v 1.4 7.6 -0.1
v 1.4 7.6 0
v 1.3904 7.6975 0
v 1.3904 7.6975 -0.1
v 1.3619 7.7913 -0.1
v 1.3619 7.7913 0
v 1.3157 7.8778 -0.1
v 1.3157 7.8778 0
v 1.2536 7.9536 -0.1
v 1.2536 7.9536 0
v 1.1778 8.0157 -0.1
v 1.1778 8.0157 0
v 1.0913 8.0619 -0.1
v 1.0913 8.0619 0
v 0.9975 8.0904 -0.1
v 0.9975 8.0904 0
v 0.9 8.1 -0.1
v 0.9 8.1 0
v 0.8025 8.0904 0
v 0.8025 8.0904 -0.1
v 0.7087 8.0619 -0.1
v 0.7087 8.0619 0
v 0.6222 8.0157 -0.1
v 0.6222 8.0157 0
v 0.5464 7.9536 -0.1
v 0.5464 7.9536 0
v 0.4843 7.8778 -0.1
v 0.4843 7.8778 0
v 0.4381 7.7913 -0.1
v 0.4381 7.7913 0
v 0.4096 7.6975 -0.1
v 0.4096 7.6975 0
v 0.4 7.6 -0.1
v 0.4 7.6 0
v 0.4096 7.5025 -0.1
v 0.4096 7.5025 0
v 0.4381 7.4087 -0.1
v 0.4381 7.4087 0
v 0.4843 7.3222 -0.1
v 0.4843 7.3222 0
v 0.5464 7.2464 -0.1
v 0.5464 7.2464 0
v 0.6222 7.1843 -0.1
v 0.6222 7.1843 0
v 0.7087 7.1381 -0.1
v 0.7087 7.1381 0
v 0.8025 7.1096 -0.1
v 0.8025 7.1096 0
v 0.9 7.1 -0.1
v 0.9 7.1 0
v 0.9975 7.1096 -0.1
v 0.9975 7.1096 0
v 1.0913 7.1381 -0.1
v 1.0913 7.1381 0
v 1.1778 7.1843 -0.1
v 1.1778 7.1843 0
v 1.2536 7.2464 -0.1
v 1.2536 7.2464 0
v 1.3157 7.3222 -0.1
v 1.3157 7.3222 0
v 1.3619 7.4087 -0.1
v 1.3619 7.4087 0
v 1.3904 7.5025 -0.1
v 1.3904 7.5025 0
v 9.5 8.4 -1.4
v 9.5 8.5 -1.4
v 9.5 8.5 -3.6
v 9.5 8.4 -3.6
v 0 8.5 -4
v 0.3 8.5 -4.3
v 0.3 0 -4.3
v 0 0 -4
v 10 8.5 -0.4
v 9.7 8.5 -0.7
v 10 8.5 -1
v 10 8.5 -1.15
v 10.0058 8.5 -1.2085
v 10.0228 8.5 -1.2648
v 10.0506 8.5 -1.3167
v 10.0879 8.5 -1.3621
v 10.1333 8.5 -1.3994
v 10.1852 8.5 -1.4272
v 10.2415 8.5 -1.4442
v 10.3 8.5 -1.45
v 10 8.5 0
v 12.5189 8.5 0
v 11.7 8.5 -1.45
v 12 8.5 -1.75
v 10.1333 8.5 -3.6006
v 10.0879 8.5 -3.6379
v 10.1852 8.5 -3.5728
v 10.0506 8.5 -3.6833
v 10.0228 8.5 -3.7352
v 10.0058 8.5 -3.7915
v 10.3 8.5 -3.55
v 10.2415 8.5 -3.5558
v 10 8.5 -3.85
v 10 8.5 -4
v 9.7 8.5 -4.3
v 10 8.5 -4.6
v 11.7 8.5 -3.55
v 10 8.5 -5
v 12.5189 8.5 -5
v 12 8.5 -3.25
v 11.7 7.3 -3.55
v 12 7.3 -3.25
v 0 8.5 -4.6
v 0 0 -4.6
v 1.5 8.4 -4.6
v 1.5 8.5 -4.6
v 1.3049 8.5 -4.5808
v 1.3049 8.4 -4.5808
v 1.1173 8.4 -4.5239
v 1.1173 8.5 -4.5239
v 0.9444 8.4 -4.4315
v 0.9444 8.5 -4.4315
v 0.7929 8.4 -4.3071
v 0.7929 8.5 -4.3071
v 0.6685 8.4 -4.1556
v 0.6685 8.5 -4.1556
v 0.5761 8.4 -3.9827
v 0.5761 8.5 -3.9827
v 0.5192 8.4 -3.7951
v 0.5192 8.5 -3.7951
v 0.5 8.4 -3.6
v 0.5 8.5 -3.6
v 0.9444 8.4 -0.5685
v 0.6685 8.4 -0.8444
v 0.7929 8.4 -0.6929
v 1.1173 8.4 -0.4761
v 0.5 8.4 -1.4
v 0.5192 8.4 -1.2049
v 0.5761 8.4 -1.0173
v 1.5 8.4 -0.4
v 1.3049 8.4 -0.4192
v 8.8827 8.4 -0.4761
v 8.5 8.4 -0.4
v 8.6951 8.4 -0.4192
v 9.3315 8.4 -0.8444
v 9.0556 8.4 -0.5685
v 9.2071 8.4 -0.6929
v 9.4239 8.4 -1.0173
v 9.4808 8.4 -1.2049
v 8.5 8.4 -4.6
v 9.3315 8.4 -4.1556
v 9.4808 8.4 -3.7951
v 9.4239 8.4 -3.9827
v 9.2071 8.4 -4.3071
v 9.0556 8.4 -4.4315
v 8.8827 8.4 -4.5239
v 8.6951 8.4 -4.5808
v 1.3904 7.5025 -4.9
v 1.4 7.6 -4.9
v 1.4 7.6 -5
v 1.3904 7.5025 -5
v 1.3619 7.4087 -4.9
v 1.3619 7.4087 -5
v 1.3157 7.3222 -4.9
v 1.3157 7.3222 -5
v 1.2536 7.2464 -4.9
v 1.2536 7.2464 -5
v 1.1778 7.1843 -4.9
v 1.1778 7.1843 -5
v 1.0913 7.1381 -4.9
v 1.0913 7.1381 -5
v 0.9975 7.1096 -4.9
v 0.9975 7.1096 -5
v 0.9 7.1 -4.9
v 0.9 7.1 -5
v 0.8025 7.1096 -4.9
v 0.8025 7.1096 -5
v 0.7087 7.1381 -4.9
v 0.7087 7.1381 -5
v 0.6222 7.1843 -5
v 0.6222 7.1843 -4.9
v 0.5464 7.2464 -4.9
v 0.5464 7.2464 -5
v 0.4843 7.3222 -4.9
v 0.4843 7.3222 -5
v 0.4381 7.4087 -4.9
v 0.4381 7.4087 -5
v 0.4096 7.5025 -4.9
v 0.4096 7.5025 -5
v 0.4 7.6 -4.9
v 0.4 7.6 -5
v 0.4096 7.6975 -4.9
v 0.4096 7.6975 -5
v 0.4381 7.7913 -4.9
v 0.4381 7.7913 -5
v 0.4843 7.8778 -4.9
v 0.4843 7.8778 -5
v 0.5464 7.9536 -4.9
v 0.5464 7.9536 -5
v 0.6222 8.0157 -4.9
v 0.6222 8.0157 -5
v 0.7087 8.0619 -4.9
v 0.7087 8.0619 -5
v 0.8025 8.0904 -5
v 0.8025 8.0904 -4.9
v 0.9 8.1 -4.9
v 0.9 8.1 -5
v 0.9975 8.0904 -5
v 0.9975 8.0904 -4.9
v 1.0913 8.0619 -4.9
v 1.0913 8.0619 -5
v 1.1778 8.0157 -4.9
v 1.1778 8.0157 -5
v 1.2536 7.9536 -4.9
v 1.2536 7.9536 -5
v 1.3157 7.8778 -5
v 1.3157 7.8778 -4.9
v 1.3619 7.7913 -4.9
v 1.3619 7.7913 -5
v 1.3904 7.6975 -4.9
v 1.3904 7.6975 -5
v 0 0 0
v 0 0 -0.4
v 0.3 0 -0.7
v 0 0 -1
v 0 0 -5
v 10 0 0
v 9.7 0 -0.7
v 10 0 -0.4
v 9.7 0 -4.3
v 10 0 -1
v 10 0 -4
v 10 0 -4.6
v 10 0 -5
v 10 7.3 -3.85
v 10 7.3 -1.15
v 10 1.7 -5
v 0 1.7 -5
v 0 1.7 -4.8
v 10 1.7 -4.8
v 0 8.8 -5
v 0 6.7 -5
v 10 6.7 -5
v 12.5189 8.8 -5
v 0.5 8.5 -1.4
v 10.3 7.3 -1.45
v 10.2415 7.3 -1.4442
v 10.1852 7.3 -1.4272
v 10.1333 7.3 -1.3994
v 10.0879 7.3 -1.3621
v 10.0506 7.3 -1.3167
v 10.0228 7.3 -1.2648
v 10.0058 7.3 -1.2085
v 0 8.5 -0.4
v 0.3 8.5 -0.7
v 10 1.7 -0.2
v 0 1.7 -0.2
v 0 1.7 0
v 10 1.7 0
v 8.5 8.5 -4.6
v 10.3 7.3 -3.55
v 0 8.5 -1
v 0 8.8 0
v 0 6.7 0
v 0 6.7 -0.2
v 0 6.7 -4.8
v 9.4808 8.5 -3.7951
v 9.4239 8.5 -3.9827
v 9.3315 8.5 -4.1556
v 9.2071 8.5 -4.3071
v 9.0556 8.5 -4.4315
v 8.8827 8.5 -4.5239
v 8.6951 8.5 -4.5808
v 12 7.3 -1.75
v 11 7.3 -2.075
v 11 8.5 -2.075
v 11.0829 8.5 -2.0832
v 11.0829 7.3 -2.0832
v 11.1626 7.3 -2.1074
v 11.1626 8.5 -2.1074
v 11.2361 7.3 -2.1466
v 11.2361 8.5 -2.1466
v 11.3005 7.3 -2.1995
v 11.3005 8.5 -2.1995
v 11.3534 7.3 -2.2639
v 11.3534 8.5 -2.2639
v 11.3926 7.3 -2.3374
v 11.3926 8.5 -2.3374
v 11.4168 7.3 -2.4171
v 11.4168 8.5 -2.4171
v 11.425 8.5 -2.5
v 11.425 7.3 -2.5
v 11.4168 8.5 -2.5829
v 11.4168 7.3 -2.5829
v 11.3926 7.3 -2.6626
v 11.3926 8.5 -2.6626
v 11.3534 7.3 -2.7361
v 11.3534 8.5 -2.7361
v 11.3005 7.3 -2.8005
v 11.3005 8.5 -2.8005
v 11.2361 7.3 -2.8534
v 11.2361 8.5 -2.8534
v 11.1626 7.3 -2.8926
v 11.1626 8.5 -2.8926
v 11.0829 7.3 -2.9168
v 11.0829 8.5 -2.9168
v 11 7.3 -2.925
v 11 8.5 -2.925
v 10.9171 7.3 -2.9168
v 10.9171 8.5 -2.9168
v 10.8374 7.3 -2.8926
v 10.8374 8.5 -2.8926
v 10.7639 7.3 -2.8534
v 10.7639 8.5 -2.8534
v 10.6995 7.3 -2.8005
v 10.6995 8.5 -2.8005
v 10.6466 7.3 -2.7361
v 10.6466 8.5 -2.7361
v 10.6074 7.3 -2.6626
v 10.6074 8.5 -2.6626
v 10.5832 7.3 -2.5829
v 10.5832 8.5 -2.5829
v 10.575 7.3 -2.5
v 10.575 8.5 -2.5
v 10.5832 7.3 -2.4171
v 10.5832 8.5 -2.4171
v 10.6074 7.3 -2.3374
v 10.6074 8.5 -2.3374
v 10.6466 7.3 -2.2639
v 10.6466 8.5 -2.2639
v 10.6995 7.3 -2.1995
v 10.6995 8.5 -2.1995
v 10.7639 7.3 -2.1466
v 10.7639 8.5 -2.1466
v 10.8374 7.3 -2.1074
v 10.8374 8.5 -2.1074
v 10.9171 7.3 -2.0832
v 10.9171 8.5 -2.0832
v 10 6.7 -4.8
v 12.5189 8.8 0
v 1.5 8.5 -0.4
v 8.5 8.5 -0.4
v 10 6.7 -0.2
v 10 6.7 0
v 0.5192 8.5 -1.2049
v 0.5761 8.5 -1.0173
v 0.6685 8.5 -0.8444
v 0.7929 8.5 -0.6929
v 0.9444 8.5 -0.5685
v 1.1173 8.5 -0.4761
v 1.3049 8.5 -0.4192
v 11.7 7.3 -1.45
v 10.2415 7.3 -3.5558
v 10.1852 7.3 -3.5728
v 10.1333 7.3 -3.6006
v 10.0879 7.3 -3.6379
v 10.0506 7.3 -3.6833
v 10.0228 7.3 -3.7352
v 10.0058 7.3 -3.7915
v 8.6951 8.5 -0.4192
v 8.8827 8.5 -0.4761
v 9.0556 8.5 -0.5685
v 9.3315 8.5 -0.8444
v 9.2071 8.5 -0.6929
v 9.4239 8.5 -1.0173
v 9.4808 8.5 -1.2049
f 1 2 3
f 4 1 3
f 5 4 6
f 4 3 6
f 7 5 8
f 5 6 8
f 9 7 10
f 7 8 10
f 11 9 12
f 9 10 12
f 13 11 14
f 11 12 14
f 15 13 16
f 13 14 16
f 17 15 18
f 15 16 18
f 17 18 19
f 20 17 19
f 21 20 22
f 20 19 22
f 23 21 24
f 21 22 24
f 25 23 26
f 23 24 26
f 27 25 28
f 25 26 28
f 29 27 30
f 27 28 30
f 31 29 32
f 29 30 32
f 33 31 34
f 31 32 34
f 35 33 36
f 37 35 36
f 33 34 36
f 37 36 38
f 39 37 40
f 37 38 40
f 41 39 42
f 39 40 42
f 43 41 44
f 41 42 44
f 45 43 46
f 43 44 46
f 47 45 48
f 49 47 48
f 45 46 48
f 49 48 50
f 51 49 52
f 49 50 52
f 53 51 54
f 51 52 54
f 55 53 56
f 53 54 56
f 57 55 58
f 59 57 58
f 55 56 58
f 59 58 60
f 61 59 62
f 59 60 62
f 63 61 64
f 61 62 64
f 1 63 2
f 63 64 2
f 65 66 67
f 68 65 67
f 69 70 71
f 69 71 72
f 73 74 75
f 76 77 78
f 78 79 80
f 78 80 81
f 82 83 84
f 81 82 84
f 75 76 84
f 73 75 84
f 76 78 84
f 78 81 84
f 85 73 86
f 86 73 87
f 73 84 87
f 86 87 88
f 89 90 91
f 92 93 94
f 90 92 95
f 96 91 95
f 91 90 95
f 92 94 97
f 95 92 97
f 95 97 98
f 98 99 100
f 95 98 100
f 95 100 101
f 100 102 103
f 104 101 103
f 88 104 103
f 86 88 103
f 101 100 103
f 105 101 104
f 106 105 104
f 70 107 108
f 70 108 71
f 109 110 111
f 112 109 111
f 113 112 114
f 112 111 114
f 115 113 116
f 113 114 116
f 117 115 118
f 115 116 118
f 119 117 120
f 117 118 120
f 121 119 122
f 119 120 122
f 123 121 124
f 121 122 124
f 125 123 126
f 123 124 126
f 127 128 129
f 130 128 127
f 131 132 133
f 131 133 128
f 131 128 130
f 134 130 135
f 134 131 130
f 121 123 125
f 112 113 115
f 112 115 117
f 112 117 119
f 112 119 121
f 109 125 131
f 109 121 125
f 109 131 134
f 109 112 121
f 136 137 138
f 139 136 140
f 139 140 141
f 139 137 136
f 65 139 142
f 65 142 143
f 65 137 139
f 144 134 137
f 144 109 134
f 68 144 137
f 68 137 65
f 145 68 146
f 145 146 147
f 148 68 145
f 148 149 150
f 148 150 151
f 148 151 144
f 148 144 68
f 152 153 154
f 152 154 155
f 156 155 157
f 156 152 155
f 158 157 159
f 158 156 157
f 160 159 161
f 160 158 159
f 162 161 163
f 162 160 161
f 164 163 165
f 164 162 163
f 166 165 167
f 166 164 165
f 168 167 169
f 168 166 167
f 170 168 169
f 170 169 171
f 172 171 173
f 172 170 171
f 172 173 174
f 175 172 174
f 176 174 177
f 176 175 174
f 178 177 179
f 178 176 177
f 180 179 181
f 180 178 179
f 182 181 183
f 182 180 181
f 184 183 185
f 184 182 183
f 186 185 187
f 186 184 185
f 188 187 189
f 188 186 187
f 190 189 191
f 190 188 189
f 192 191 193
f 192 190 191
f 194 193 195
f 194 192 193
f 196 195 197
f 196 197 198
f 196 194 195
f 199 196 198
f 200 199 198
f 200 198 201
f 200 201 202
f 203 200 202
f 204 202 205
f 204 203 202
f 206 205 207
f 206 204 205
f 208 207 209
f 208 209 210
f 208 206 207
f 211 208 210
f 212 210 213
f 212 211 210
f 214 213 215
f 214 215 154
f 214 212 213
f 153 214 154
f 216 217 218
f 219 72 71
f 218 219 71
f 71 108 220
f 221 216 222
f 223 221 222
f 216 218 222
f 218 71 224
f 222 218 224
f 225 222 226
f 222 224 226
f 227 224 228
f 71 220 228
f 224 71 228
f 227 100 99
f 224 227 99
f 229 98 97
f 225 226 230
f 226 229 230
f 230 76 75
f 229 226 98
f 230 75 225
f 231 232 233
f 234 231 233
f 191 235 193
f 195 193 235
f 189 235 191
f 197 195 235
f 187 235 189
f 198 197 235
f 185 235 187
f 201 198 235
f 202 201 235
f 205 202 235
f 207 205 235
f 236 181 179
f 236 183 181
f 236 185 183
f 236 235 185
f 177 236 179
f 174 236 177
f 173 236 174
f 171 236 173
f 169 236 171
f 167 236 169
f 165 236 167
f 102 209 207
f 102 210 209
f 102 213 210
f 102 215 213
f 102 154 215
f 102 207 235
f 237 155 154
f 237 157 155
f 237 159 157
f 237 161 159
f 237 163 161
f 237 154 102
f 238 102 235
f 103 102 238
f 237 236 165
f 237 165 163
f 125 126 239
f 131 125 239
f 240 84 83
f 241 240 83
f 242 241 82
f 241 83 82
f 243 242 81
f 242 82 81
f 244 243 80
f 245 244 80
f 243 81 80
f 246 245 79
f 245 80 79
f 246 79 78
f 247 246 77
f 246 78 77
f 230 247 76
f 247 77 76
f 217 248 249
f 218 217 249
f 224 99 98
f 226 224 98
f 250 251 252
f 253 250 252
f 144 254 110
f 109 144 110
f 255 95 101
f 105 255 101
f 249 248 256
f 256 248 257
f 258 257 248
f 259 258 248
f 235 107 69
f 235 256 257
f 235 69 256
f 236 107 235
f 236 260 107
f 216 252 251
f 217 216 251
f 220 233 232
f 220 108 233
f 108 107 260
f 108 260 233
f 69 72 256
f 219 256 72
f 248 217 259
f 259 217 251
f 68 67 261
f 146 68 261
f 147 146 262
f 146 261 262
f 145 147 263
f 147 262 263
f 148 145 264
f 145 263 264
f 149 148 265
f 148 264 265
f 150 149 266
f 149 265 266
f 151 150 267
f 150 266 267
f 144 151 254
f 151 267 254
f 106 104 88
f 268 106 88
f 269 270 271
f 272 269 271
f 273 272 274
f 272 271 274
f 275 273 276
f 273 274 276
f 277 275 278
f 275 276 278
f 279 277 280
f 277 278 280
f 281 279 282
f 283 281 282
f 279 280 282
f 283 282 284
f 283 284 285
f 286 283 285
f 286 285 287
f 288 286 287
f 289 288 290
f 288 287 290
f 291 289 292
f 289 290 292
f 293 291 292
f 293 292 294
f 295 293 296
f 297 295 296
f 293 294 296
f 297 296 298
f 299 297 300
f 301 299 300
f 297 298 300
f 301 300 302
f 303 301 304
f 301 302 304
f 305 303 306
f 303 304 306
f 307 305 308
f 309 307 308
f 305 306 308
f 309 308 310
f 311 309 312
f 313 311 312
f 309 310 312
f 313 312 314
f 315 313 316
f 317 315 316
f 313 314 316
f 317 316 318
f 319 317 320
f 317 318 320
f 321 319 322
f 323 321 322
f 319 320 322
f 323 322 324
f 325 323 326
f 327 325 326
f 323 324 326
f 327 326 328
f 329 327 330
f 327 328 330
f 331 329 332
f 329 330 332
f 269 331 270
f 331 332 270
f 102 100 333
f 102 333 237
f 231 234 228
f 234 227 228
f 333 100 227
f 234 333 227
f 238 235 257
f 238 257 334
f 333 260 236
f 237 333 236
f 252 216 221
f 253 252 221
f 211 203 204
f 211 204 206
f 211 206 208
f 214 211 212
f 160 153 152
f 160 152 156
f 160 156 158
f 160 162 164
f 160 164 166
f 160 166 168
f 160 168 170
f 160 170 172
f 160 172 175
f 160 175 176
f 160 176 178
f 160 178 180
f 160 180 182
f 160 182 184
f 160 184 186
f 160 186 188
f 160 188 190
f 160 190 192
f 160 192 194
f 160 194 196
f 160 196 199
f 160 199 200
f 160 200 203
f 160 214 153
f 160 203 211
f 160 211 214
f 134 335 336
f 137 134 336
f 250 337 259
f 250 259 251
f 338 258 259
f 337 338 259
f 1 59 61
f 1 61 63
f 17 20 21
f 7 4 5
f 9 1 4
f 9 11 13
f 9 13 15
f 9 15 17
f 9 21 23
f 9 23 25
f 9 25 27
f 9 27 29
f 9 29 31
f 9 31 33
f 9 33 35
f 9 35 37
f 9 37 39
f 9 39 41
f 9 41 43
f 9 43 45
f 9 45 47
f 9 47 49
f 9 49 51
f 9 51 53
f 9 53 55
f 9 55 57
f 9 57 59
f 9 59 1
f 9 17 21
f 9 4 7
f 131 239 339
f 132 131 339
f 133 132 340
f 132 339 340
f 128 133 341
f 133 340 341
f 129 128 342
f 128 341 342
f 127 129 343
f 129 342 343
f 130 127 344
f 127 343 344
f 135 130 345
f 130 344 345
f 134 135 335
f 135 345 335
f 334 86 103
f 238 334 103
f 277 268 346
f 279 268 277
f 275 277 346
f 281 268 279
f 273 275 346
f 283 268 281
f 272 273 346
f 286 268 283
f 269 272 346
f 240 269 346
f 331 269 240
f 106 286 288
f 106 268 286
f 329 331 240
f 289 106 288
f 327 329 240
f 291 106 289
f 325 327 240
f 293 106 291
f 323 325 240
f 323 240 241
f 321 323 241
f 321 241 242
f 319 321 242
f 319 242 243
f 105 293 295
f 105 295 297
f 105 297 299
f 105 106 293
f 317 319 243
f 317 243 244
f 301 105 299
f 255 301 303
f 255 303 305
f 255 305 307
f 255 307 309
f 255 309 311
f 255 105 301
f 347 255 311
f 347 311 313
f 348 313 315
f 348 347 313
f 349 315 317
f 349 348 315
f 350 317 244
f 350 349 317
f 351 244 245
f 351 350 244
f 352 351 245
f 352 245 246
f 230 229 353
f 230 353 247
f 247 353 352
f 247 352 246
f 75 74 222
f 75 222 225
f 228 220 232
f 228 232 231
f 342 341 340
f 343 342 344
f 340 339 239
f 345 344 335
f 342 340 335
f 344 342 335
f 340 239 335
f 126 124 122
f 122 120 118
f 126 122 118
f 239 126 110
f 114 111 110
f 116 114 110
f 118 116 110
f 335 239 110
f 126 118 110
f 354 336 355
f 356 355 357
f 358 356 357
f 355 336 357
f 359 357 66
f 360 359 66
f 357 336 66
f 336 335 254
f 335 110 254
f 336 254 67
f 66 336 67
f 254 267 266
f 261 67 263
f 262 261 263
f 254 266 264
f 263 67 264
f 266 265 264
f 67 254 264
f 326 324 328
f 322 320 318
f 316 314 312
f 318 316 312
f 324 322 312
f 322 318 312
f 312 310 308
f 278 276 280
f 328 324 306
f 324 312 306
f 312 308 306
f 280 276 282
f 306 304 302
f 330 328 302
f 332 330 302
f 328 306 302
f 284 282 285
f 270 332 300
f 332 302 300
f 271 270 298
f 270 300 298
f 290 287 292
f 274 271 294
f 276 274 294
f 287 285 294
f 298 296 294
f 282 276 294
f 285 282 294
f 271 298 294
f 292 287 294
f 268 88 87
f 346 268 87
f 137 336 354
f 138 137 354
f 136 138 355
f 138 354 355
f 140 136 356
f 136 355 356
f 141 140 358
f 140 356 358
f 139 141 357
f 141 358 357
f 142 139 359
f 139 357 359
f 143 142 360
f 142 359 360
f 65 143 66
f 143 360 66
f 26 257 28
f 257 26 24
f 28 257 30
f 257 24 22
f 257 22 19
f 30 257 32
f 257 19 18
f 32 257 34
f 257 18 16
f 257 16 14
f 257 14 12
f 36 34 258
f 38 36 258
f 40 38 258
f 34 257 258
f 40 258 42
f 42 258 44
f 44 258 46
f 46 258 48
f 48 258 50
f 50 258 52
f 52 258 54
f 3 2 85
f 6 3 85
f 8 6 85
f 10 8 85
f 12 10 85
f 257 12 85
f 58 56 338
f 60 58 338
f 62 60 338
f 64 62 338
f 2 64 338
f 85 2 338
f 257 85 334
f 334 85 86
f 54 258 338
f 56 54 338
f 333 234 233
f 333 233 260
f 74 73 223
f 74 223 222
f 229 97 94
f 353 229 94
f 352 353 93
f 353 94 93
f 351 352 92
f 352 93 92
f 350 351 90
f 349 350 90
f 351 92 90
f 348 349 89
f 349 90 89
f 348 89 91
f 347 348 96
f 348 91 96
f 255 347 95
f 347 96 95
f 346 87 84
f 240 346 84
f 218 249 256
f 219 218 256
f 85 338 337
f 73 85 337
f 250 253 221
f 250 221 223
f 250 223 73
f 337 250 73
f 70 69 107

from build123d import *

# Parameters (mm, degrees)
SKETCH11_W          = 10
SKETCH11_H          = 5
BOSS_EXTRUDE2_DEPTH = 8.5
SKETCH12_OUTSIDE_W  = 9.808
SKETCH12_OUTSIDE_H  = 13.308
CUT_EXTRUDE1_DEPTH  = 11
CUT_EXTRUDE2_DEPTH  = 8.3
CUT_EXTRUDE6_DEPTH  = 6
CUT_EXTRUDE3_DEPTH  = 1.5
CUT_EXTRUDE4_DEPTH  = 8.3
BOSS_EXTRUDE3_DEPTH = 9.5
CUT_EXTRUDE5_DEPTH  = 9.5
SKETCH19_R          = 0.5
CUT_EXTRUDE7_DEPTH  = 0.1
CUT_EXTRUDE8_START  = -0.1
SKETCH20_R          = 0.5
CUT_EXTRUDE8_DEPTH  = 0.1
SKETCH21_R          = 0.425
BOSS_EXTRUDE4_DEPTH = 1.2
SKETCH22_W          = 9.218939703
SKETCH22_H          = 4.445853418
BOSS_EXTRUDE5_DEPTH = 8.2
SKETCH23_W          = 12.5189076
SKETCH23_H          = 5
BOSS_EXTRUDE6_DEPTH = 0.3


with BuildPart() as part:
    # Sketch11 → Boss-Extrude2 (new body)
    with BuildSketch(Plane(origin=(0, 0, 0), x_dir=(1, 0, 0), z_dir=(0, 1, 0))):
        with Locations((5, 2.5)):
            Rectangle(SKETCH11_W, SKETCH11_H)
    extrude(amount=BOSS_EXTRUDE2_DEPTH)

    # Sketch12 outside → Cut-Extrude1 (cut)
    with BuildSketch(Plane(origin=(10, 0, 0), x_dir=(0, 0, -1), z_dir=(1, 0, 0))):
        with Locations((2.5, 4.25)):
            Rectangle(SKETCH12_OUTSIDE_W, SKETCH12_OUTSIDE_H)
        Polygon((0, 8.5), (0, 6.7), (0.2, 6.7), (0.2, 1.7), (0, 1.7), (0, 0), (5, 0), (5, 1.7), (4.8, 1.7), (4.8, 6.7), (5, 6.7), (5, 8.5), align=None, mode=Mode.SUBTRACT)
    extrude(amount=-CUT_EXTRUDE1_DEPTH, mode=Mode.SUBTRACT)

    # Sketch13 → Cut-Extrude2 (cut)
    with BuildSketch(Plane.XZ.offset(-8.5)):
        with BuildLine():
            Line((1, -0.6), (9, -0.6))
            ThreePointArc((9, -0.6), (9.141421356, -0.658578644), (9.2, -0.8))
            Line((9.2, -0.8), (9.2, -4.2))
            ThreePointArc((9.2, -4.2), (9.141421356, -4.341421356), (9, -4.4))
            Line((9, -4.4), (1, -4.4))
            ThreePointArc((1, -4.4), (0.858578644, -4.341421356), (0.8, -4.2))
            Line((0.8, -4.2), (0.8, -0.8))
            ThreePointArc((0.8, -0.8), (0.858578644, -0.658578644), (1, -0.6))
        make_face()
    extrude(amount=CUT_EXTRUDE2_DEPTH, mode=Mode.SUBTRACT)

    # Sketch18 → Cut-Extrude6 (cut)
    with BuildSketch(Plane(origin=(0, 8.5, 0), x_dir=(1, 0, 0), z_dir=(0, 1, 0))):
        with BuildLine():
            Line((1.5, 3.855615714), (4.2, 3.855615714))
            Line((4.2, 3.855615714), (4.2, 4.4))
            ThreePointArc((4.2, 4.4), (4.141421356, 4.541421356), (4, 4.6))
            Line((4, 4.6), (1.7, 4.6))
            ThreePointArc((1.7, 4.6), (1.558578644, 4.541421356), (1.5, 4.4))
            Line((1.5, 4.4), (1.5, 3.855615714))
        make_face()
    extrude(amount=-CUT_EXTRUDE6_DEPTH, mode=Mode.SUBTRACT)

    # Sketch14 → Cut-Extrude3 (cut)
    with BuildSketch(Plane.XZ.offset(-8.5)):
        with BuildLine():
            Line((8.5, -4.6), (1.5, -4.6))
            ThreePointArc((1.5, -4.6), (0.792893219, -4.307106781), (0.5, -3.6))
            Line((0.5, -3.6), (0.5, -1.4))
            ThreePointArc((0.5, -1.4), (0.792893219, -0.692893219), (1.5, -0.4))
            Line((1.5, -0.4), (8.5, -0.4))
            ThreePointArc((8.5, -0.4), (9.207106781, -0.692893219), (9.5, -1.4))
            Line((9.5, -1.4), (9.5, -3.6))
            ThreePointArc((9.5, -3.6), (9.207106781, -4.307106781), (8.5, -4.6))
        make_face()
    extrude(amount=CUT_EXTRUDE3_DEPTH, mode=Mode.SUBTRACT)

    # Sketch15 → Cut-Extrude4 (cut)
    with BuildSketch(Plane(origin=(0, 8.5, 0), x_dir=(1, 0, 0), z_dir=(0, 1, 0))):
        with BuildLine():
            Line((0.6, 3.6), (9.4, 3.6))
            ThreePointArc((9.4, 3.6), (9.470710678, 3.570710678), (9.5, 3.5))
            Line((9.5, 3.5), (9.5, 1.5))
            ThreePointArc((9.5, 1.5), (9.470710678, 1.429289322), (9.4, 1.4))
            Line((9.4, 1.4), (0.6, 1.4))
            ThreePointArc((0.6, 1.4), (0.529289322, 1.429289322), (0.5, 1.5))
            Line((0.5, 1.5), (0.5, 3.5))
            ThreePointArc((0.5, 3.5), (0.529289322, 3.570710678), (0.6, 3.6))
        make_face()
    extrude(amount=-CUT_EXTRUDE4_DEPTH, mode=Mode.SUBTRACT)

    # Sketch16 → Boss-Extrude3 (add)
    with BuildSketch(Plane.ZY):
        Polygon((-4.839479829, 0.939479829), (-4.1, 0.2), (-4.839479829, 0.2), align=None)
        Polygon((-0.9, 0.2), (-0.040645339, 1.059354661), (-0.040645339, 0.2), align=None)
    extrude(amount=-BOSS_EXTRUDE3_DEPTH)

    # Sketch17 → Cut-Extrude5 (cut)
    with BuildSketch(Plane(origin=(0, 8.5, 0), x_dir=(1, 0, 0), z_dir=(0, 1, 0))):
        Polygon((-0.242330702, 4.842330702), (0.3, 4.3), (-0.242330702, 3.757669298), align=None)
        Polygon((10.242330702, 3.757669298), (10.242330702, 4.842330702), (9.7, 4.3), align=None)
        Polygon((10.242330702, 0.157669298), (9.7, 0.7), (10.242330702, 1.242330702), align=None)
        Polygon((-0.242330702, 1.242330702), (-0.242330702, 0.157669298), (0.3, 0.7), align=None)
    extrude(amount=-CUT_EXTRUDE5_DEPTH, mode=Mode.SUBTRACT)

    # Sketch19 → Cut-Extrude7 (cut)
    with BuildSketch(Plane.XY):
        with Locations((0.9, 7.6)):
            Circle(SKETCH19_R)
    extrude(amount=-CUT_EXTRUDE7_DEPTH, mode=Mode.SUBTRACT)

    # Sketch20 → Cut-Extrude8 (cut)
    with BuildSketch(Plane(origin=(0, 0, -5), x_dir=(-1, 0, 0), z_dir=(0, 0, -1)).offset(CUT_EXTRUDE8_START)):
        with Locations(Location((-0.9, 7.6, 0), (0, 0, 180))):
            Circle(SKETCH20_R)
    extrude(amount=CUT_EXTRUDE8_DEPTH, mode=Mode.SUBTRACT)

    # Sketch21 → Boss-Extrude4 (add)
    with BuildSketch(Plane(origin=(0, 8.5, 0), x_dir=(1, 0, 0), z_dir=(0, 1, 0))):
        with BuildLine():
            Line((10.3, 3.55), (11.7, 3.55))
            Line((11.7, 3.55), (12, 3.25))
            Line((12, 3.25), (12, 1.75))
            Line((12, 1.75), (11.7, 1.45))
            Line((11.7, 1.45), (10.3, 1.45))
            ThreePointArc((10.3, 1.45), (10.087867966, 1.362132034), (10, 1.15))
            Line((10, 1.15), (10, 1))
            Line((10, 1), (9.555439603, 1))
            Line((9.555439603, 1), (9.555439603, 3.976356754))
            Line((9.555439603, 3.976356754), (10, 3.976356754))
            Line((10, 3.976356754), (10, 3.85))
            ThreePointArc((10, 3.85), (10.087867966, 3.637867966), (10.3, 3.55))
        make_face()
        with Locations(Location((11, 2.5, 0), (0, 0, 270))):
            Circle(SKETCH21_R, mode=Mode.SUBTRACT)
    extrude(amount=-BOSS_EXTRUDE4_DEPTH)

    # Sketch22 → Boss-Extrude5 (add)
    with BuildSketch(Plane(origin=(0, 0.2, 0), x_dir=(1, 0, 0), z_dir=(0, 1, 0))):
        with Locations((4.995733619, 2.483074162)):
            Rectangle(SKETCH22_W, SKETCH22_H)
    extrude(amount=BOSS_EXTRUDE5_DEPTH)

    # Sketch23 → Boss-Extrude6 (add)
    with BuildSketch(Plane(origin=(0, 8.5, 0), x_dir=(1, 0, 0), z_dir=(0, 1, 0))):
        with Locations((6.2594538, 2.5)):
            Rectangle(SKETCH23_W, SKETCH23_H)
    extrude(amount=BOSS_EXTRUDE6_DEPTH)


solid = part.part
